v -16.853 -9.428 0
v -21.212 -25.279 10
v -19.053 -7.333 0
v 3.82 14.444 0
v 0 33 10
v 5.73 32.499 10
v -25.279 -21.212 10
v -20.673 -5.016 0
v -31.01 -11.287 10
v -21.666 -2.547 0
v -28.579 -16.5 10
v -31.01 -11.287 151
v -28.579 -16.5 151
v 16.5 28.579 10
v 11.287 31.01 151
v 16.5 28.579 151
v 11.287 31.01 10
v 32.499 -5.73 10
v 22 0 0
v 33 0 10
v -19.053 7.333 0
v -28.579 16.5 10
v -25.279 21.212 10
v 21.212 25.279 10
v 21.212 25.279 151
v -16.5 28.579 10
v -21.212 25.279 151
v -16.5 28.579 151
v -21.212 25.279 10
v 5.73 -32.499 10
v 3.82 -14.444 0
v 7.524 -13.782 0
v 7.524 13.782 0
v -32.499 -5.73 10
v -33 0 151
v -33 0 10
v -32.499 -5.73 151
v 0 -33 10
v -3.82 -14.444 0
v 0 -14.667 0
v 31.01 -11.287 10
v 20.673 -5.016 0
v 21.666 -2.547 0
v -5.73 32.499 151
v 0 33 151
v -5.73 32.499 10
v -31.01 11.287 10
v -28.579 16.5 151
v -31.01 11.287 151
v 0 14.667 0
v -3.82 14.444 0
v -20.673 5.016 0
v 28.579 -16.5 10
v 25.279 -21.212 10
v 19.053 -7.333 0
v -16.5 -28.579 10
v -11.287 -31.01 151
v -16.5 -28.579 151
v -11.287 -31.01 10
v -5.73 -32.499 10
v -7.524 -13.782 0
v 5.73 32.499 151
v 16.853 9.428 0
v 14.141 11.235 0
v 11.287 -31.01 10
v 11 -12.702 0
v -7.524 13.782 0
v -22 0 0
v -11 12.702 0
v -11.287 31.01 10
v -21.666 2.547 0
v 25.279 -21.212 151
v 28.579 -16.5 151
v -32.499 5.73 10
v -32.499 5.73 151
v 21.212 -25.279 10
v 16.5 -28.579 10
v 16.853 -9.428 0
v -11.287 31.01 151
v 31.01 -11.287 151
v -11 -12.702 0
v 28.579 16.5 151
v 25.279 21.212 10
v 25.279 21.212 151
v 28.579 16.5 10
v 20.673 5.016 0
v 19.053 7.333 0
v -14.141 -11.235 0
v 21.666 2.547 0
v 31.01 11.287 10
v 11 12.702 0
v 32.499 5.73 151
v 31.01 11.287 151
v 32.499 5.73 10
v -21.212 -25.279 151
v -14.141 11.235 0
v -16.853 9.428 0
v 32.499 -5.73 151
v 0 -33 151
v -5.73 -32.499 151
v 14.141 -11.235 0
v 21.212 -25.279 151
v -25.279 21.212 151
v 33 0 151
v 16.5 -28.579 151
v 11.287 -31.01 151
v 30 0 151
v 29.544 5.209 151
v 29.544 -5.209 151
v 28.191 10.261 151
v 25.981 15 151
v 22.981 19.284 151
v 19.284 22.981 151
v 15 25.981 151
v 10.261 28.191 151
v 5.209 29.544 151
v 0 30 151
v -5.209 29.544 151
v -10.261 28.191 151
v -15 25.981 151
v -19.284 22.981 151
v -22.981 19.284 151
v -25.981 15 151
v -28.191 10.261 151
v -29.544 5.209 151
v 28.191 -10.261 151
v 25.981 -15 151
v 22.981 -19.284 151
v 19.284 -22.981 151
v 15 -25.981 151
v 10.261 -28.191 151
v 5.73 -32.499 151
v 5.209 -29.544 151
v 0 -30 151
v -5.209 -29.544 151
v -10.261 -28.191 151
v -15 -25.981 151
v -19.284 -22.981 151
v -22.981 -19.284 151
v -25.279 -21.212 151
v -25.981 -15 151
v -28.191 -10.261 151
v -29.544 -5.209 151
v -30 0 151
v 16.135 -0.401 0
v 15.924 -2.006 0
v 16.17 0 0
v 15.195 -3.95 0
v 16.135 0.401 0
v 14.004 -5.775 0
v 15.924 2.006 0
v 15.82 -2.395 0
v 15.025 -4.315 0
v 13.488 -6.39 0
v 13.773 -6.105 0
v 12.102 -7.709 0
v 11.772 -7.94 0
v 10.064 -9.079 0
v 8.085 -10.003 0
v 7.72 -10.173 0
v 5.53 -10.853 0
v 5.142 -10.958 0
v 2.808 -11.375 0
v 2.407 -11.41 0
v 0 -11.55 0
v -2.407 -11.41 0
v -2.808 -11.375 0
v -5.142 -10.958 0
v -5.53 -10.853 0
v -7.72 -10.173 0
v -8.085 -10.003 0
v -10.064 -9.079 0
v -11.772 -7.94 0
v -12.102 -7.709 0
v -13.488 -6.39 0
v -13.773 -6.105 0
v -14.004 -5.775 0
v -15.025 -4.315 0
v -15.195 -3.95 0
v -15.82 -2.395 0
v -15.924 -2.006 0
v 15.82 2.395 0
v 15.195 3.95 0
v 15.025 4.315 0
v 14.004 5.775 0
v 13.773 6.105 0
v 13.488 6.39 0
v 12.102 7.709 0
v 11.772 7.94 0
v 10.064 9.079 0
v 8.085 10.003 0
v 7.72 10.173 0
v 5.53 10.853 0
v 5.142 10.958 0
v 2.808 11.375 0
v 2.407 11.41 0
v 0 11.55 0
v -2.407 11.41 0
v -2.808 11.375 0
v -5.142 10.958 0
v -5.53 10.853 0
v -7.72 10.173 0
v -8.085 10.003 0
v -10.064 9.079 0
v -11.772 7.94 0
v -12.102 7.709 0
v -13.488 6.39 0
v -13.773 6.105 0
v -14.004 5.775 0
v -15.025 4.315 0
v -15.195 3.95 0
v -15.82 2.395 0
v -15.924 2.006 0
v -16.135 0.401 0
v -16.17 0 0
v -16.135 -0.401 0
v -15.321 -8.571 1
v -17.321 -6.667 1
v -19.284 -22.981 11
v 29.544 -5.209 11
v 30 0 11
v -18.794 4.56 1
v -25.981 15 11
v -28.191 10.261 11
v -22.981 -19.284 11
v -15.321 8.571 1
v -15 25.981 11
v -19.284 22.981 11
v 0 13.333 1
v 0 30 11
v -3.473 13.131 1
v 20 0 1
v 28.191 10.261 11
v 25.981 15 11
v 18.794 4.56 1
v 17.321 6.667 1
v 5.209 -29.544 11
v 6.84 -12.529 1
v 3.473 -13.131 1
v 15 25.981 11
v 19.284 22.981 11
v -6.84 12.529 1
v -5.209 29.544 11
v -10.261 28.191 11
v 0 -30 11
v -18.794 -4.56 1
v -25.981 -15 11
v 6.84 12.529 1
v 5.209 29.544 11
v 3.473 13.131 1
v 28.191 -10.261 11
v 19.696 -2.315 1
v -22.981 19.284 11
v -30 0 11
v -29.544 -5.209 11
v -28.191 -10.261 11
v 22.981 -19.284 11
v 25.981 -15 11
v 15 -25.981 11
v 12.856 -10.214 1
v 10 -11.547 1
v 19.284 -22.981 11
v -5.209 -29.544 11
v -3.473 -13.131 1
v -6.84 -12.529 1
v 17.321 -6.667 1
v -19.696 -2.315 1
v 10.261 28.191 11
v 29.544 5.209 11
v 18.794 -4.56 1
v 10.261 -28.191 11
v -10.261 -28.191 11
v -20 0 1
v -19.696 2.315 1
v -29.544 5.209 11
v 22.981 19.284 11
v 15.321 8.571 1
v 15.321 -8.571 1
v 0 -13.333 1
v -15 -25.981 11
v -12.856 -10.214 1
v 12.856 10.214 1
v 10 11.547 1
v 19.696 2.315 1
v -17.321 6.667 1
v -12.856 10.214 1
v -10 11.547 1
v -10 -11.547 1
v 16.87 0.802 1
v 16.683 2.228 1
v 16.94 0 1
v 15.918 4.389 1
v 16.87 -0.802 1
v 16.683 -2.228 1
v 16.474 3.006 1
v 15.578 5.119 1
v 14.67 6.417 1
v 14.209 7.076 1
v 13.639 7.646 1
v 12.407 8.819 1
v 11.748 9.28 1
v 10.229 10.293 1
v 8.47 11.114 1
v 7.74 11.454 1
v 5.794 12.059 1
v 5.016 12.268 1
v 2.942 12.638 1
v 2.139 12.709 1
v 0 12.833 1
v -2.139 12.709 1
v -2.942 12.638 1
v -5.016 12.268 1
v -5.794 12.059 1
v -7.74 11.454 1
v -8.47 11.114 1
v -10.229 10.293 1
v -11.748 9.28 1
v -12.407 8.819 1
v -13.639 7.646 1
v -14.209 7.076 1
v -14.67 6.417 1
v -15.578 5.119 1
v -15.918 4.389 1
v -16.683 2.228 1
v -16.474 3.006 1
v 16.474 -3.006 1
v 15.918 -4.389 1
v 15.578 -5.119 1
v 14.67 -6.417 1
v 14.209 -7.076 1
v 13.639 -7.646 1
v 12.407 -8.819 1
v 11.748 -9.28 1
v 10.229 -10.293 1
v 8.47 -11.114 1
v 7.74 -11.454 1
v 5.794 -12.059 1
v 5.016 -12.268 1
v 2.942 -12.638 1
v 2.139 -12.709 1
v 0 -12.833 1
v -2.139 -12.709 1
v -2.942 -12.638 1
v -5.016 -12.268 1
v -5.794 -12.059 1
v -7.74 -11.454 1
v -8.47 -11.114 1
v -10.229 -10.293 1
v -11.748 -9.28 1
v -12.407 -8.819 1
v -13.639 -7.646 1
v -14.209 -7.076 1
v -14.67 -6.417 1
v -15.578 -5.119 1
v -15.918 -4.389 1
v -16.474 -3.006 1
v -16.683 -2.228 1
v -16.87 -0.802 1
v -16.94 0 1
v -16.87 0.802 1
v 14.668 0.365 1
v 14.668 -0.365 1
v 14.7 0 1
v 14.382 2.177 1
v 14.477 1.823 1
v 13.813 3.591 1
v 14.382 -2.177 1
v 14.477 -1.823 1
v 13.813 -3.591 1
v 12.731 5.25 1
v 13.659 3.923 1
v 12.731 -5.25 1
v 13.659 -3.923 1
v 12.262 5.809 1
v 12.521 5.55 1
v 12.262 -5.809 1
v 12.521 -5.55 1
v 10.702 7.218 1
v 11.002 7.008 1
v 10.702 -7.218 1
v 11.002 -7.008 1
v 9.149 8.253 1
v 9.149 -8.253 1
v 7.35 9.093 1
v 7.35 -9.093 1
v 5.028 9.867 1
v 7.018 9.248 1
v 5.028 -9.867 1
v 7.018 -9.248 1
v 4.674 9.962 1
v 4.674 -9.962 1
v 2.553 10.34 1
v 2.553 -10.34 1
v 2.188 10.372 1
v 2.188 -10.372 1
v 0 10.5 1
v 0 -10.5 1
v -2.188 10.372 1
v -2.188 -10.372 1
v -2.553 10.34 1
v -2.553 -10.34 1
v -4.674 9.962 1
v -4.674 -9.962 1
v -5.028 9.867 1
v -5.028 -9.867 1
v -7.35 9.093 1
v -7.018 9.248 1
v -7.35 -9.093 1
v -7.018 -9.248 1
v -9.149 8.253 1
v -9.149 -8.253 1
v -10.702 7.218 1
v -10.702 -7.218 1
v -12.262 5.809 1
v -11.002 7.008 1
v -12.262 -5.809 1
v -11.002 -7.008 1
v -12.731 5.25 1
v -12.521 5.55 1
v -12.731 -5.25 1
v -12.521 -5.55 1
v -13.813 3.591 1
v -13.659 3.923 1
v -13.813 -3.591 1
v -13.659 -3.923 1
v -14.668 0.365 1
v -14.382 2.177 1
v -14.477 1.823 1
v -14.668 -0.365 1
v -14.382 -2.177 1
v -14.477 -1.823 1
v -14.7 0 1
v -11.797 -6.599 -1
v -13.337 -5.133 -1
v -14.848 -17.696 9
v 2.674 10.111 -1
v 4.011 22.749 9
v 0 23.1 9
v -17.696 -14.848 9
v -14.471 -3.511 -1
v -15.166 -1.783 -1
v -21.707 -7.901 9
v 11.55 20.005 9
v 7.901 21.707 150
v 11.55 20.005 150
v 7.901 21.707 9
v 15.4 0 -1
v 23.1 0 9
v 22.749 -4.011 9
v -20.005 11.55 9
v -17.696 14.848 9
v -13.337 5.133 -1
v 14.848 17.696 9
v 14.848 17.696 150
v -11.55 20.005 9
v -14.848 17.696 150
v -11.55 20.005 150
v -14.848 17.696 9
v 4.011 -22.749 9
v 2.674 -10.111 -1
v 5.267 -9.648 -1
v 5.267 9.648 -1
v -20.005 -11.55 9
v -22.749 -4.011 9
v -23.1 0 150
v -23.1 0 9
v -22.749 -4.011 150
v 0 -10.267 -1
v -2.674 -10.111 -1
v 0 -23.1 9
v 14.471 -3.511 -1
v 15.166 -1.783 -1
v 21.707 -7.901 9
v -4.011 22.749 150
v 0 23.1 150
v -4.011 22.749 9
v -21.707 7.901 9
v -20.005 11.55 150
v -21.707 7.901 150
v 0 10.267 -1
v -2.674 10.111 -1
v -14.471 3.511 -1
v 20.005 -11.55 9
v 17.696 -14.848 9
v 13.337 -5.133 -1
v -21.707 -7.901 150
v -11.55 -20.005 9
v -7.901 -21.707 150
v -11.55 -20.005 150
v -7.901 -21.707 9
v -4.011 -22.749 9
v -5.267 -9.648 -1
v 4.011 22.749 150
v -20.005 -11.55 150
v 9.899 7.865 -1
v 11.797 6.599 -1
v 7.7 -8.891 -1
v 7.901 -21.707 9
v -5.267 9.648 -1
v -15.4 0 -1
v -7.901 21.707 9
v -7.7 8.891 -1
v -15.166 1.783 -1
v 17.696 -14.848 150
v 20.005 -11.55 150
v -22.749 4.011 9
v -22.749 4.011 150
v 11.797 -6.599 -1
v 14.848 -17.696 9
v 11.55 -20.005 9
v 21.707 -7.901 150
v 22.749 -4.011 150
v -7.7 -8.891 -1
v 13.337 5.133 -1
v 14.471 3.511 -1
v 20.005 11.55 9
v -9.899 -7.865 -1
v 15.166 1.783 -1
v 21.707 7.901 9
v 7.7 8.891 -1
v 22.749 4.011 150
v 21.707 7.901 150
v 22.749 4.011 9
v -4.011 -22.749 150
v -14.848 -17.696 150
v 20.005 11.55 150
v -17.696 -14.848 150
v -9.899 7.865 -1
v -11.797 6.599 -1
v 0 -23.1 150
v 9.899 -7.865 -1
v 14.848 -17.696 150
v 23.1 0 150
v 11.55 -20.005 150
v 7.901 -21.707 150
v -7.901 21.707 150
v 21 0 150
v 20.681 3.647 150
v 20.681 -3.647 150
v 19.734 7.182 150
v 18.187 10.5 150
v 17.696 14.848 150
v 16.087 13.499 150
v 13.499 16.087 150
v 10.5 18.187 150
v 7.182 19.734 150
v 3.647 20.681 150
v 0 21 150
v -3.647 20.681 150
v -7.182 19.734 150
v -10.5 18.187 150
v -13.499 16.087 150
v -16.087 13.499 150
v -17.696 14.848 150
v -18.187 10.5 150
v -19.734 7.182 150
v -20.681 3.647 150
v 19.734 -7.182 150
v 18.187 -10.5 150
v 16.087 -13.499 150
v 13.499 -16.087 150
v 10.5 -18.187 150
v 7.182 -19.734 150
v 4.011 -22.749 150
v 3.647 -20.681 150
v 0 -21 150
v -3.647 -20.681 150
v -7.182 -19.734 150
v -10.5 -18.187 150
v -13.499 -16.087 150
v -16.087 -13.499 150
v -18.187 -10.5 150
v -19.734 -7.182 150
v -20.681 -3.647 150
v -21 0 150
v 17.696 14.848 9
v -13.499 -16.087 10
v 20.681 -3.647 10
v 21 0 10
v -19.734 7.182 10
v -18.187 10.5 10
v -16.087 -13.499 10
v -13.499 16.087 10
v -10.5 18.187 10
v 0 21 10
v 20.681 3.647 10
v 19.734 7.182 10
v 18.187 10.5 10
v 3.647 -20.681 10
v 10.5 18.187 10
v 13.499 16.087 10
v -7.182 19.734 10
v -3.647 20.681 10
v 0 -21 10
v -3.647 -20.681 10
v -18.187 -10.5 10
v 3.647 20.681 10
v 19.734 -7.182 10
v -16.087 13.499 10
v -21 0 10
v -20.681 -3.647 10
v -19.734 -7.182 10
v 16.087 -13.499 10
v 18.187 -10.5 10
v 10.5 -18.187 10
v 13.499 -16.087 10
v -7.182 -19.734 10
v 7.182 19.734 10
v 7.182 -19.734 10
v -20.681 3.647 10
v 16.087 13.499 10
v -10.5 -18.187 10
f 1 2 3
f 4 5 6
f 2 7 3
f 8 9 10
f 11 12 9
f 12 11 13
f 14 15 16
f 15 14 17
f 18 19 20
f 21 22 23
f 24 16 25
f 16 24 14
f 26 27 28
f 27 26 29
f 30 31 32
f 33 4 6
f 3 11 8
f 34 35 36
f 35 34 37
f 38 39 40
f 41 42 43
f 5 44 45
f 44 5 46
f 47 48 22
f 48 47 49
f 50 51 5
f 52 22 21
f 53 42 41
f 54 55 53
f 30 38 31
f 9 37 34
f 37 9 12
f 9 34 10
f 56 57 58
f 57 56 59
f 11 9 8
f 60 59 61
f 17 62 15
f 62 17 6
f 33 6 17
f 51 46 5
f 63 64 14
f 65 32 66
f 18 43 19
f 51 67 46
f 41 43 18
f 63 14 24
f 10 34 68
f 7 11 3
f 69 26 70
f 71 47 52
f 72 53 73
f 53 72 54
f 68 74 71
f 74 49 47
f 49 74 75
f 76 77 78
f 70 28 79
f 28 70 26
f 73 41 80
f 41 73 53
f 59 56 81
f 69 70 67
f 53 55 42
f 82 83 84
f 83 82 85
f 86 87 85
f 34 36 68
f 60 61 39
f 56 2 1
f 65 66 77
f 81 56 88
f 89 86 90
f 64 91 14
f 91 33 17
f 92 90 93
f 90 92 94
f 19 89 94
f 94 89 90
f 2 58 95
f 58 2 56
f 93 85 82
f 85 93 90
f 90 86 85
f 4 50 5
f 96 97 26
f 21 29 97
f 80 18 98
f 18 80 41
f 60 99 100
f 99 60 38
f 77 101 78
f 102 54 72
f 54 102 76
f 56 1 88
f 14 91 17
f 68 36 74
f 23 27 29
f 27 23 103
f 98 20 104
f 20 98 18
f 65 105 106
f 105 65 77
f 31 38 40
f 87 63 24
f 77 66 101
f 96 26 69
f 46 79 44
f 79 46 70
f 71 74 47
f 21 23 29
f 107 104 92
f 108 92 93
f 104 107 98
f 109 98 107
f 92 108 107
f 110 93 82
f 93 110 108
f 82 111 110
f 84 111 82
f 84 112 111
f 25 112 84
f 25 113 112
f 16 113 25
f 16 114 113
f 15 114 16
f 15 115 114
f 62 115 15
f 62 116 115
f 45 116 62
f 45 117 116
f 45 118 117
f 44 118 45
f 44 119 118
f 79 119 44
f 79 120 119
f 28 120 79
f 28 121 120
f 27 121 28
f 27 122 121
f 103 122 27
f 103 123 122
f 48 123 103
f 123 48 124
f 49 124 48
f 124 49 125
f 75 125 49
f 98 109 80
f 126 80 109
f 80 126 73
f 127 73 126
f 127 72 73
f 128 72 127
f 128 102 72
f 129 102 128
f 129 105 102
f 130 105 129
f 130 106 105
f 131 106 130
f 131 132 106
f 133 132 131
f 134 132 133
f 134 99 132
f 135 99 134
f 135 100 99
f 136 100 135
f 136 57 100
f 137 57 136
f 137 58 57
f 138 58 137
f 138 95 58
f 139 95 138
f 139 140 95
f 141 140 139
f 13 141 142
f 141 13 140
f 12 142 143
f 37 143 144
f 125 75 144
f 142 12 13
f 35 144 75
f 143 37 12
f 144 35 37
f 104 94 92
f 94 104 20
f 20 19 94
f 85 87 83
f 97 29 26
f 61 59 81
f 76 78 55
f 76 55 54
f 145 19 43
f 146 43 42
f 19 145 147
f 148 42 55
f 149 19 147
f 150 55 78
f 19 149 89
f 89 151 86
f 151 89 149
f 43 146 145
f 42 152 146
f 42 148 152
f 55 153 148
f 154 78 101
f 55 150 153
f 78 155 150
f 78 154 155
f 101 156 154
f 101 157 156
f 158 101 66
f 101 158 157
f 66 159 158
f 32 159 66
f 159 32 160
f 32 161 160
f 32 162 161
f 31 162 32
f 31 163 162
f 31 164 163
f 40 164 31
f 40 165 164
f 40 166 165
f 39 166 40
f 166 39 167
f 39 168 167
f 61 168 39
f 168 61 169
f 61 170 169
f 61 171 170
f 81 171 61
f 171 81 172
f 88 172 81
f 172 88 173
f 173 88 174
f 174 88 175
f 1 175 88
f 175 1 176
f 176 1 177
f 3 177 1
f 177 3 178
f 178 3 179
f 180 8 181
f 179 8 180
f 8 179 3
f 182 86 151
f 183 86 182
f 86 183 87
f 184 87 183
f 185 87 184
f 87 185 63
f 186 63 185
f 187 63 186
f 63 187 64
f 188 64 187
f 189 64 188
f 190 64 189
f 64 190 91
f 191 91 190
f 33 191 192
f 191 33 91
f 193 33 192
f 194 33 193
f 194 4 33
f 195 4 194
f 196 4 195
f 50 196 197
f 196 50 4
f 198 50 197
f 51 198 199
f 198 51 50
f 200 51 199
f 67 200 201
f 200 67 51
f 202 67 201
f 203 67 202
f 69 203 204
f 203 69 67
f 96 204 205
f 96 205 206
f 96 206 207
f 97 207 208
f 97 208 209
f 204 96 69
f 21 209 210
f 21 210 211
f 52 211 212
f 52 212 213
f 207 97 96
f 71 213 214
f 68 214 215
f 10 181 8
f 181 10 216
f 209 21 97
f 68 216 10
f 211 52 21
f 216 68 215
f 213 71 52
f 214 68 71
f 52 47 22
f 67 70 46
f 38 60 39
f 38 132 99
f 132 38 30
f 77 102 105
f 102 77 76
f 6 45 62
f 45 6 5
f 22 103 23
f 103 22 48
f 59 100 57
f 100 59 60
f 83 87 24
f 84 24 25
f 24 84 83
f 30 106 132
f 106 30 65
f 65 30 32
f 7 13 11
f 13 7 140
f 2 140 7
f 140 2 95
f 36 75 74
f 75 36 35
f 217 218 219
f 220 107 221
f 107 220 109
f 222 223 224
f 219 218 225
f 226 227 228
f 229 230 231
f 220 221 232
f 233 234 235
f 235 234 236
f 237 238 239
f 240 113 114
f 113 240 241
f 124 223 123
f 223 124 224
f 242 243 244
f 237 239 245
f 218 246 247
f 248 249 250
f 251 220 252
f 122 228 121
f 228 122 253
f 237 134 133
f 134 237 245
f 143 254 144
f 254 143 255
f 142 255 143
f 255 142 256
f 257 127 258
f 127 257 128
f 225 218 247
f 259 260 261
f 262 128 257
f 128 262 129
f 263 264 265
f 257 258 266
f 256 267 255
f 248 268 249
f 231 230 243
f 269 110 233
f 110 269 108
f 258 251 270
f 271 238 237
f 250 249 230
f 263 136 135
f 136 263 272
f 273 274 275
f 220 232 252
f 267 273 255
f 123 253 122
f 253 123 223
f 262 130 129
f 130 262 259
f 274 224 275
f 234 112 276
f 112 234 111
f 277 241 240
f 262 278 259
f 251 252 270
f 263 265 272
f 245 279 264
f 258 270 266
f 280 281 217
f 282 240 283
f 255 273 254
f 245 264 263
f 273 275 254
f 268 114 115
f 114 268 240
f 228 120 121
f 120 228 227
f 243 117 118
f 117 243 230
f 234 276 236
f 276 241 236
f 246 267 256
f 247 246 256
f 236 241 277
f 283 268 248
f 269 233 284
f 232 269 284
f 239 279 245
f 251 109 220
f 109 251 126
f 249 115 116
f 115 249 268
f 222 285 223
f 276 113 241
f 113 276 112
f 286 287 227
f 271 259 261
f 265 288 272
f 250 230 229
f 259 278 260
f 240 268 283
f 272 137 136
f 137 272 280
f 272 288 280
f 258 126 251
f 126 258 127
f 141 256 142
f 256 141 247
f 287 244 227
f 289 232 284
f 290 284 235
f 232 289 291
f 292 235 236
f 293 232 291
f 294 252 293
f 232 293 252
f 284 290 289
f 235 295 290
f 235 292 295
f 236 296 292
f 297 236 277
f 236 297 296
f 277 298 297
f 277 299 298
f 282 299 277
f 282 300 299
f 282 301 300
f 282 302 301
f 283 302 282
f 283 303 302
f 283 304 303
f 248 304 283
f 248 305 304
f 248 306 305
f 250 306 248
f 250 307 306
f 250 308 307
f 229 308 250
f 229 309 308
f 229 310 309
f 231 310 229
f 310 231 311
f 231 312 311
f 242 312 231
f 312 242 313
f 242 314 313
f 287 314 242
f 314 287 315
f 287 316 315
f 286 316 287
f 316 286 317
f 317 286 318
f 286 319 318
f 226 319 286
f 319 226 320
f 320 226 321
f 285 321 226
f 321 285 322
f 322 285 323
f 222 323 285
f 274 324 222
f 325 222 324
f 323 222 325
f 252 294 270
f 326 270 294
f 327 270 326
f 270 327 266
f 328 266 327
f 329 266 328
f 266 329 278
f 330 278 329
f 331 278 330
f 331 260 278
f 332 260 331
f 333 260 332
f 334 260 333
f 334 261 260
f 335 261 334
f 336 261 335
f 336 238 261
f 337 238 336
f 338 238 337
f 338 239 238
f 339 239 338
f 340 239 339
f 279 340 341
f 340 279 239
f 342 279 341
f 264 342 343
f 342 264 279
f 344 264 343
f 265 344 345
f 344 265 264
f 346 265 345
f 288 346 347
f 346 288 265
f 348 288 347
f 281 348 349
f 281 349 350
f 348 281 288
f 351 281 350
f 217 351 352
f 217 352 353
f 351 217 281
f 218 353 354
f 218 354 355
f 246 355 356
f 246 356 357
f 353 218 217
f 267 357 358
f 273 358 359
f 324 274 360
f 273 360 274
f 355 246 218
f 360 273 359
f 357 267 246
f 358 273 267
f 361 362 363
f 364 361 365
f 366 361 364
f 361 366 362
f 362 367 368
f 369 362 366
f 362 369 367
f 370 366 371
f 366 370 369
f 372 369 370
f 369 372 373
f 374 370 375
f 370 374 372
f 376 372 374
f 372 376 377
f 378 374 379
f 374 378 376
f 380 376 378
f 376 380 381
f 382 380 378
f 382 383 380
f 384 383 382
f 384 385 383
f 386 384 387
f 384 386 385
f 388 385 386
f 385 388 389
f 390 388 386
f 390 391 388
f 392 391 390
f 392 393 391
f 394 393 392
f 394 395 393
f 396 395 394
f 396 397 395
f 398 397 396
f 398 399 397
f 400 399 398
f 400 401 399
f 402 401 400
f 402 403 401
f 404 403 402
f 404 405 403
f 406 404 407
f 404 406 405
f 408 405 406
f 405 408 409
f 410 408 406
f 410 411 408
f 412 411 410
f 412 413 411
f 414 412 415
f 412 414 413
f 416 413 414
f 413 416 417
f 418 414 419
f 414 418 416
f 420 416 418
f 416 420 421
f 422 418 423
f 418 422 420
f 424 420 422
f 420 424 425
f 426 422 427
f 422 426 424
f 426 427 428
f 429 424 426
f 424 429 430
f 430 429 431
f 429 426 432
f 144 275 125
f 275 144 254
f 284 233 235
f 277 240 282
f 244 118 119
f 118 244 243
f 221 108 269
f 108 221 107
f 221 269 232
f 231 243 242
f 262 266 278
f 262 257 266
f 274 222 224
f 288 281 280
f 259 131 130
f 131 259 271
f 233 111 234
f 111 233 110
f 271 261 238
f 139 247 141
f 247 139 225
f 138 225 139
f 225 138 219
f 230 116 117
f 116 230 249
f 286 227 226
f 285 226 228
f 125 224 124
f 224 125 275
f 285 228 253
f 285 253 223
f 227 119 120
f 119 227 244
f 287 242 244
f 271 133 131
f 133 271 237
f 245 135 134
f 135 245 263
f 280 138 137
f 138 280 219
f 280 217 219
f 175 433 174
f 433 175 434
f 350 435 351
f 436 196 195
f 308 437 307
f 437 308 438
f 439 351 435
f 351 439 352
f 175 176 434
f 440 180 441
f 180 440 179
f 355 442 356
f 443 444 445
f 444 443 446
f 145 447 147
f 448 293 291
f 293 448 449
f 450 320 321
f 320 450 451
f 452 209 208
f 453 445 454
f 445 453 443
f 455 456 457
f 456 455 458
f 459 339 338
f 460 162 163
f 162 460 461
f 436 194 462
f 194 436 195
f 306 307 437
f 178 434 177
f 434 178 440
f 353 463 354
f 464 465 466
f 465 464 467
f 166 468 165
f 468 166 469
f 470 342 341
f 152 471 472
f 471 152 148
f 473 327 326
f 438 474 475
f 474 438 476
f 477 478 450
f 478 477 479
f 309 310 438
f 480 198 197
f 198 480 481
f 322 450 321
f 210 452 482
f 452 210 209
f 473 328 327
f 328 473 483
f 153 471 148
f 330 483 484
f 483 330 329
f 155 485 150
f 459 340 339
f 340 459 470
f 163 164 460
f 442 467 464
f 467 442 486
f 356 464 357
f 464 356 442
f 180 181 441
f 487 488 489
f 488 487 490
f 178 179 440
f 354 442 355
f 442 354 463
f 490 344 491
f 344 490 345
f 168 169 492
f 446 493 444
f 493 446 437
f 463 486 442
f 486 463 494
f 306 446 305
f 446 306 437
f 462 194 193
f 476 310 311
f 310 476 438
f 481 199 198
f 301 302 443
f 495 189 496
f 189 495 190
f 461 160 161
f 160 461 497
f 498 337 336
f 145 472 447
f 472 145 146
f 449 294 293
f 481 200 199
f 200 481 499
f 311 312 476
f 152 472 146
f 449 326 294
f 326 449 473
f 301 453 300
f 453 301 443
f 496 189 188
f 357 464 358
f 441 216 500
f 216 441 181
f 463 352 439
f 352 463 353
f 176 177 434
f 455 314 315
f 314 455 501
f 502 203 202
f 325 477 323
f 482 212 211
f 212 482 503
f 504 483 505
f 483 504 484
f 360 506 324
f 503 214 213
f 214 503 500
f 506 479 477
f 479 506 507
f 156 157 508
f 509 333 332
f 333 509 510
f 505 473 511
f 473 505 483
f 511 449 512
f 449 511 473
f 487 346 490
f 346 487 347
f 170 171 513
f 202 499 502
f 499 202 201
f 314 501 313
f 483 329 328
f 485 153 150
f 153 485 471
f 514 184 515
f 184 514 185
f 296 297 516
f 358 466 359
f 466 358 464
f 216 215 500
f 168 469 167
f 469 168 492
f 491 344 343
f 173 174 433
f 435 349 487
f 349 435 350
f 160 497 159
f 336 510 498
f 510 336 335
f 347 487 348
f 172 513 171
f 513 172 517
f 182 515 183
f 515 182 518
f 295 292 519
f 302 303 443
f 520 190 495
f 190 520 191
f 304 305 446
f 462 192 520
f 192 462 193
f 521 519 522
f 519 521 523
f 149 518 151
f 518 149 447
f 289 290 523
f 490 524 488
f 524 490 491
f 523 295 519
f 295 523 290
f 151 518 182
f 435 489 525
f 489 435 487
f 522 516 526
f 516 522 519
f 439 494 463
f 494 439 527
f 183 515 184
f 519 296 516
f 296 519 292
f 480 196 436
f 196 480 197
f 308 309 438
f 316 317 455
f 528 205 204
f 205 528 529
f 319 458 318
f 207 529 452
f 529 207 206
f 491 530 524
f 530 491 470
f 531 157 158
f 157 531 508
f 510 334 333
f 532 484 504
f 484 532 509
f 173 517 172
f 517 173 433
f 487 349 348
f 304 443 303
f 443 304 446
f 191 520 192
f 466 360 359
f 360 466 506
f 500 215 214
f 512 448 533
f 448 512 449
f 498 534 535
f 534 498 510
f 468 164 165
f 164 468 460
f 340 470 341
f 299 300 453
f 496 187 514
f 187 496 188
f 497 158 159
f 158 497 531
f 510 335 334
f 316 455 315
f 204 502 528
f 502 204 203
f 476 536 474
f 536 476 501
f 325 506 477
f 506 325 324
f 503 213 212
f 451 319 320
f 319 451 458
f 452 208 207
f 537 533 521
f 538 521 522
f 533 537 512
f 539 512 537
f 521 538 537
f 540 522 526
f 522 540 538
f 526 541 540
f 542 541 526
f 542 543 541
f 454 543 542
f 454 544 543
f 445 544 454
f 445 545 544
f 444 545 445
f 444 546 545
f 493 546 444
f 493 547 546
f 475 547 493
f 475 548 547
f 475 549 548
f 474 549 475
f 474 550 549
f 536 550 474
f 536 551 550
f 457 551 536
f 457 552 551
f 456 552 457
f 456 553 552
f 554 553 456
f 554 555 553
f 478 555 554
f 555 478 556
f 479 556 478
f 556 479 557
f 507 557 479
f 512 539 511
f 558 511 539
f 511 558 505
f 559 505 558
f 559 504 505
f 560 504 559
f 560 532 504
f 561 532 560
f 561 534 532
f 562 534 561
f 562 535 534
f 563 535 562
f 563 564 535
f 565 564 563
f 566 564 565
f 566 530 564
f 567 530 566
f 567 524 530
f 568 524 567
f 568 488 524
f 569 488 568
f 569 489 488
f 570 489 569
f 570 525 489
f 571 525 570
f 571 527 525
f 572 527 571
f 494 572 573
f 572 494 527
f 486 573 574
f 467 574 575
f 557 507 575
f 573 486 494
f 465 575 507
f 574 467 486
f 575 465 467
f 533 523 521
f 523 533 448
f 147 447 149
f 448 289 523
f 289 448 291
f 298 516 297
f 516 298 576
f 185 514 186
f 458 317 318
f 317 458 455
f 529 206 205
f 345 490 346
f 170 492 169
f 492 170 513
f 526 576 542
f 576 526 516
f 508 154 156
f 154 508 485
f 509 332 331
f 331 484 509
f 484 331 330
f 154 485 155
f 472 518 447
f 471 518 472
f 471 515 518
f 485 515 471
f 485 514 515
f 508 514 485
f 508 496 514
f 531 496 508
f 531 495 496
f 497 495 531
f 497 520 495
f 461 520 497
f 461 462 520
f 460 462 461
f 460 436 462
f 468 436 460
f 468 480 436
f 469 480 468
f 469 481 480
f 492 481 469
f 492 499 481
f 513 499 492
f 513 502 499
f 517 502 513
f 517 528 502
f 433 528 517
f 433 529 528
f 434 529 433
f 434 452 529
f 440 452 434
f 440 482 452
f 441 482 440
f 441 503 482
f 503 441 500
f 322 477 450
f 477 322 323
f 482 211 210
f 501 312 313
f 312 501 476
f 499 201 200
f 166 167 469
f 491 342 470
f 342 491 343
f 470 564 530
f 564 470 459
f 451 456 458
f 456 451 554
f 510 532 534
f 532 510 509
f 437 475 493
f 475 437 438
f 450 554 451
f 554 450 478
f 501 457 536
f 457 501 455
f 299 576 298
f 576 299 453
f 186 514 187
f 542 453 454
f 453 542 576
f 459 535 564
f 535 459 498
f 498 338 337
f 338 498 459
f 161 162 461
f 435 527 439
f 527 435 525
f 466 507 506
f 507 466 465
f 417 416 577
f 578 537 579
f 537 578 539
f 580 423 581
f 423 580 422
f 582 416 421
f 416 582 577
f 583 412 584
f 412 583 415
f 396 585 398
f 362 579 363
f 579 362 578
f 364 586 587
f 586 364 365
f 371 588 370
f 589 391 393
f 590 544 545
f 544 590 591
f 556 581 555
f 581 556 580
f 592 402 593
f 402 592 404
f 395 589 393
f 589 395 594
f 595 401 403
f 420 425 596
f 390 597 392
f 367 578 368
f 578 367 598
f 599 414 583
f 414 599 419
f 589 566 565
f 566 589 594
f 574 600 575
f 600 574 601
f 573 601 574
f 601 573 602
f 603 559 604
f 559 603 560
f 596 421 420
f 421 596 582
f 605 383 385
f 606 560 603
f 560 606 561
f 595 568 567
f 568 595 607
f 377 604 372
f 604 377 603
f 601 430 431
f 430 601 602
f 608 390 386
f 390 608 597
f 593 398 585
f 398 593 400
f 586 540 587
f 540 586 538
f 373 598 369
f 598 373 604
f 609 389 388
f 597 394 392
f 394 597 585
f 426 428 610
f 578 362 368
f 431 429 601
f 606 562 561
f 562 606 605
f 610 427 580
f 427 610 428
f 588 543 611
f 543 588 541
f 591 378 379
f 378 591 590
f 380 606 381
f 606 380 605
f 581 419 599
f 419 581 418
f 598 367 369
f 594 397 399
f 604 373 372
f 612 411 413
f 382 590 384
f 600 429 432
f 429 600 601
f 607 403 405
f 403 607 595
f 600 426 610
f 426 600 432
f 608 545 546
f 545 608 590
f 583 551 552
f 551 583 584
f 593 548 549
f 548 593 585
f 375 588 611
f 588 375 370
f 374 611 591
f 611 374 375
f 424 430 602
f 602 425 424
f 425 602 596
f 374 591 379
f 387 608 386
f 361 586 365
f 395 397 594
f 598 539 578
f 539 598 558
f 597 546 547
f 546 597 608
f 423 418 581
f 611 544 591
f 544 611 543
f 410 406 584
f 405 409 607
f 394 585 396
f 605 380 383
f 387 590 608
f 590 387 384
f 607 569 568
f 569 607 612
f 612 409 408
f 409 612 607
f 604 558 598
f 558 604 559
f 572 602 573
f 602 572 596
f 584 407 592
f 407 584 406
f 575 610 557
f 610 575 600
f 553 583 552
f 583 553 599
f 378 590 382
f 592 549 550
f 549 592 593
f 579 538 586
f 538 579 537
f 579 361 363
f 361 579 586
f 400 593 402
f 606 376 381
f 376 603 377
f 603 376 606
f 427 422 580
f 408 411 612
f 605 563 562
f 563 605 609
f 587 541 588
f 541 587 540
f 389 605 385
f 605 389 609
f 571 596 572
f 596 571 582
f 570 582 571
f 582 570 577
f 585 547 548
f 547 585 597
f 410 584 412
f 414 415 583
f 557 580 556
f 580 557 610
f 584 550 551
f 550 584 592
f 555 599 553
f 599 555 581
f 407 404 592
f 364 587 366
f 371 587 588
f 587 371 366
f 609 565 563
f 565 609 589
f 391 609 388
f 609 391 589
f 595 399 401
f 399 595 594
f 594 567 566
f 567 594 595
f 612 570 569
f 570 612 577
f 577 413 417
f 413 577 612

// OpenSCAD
module m1() {
    hull() {
      translate([0, 0, 150]) cylinder(r=30,  h=1, $fn=36);
      translate([0, 0, 100]) cylinder(  r=3,  h=1 ,$fn=36);
      translate([0, 0, 80]) cylinder(  r=4,  h=1 ,$fn=36);
      translate([0, 0, 10]) cylinder(  r=30  ,h=1, $fn=36);
      translate([0, 0, 0]) scale([20, 20/1.5, 1]) cylinder(r1=1,r2=1, h=1, $fn=36);
    }
}
difference() {
 scale([1.1, 1.1, 1.0])m1();
 translate([0,0,1]) m1();
}

 translate([0,0,-1])scale([0.7, 0.7, 1.0])
difference() {
 scale([1.1, 1.1, 1.0])m1();
 translate([0,0,1]) m1();
}
//m1();
